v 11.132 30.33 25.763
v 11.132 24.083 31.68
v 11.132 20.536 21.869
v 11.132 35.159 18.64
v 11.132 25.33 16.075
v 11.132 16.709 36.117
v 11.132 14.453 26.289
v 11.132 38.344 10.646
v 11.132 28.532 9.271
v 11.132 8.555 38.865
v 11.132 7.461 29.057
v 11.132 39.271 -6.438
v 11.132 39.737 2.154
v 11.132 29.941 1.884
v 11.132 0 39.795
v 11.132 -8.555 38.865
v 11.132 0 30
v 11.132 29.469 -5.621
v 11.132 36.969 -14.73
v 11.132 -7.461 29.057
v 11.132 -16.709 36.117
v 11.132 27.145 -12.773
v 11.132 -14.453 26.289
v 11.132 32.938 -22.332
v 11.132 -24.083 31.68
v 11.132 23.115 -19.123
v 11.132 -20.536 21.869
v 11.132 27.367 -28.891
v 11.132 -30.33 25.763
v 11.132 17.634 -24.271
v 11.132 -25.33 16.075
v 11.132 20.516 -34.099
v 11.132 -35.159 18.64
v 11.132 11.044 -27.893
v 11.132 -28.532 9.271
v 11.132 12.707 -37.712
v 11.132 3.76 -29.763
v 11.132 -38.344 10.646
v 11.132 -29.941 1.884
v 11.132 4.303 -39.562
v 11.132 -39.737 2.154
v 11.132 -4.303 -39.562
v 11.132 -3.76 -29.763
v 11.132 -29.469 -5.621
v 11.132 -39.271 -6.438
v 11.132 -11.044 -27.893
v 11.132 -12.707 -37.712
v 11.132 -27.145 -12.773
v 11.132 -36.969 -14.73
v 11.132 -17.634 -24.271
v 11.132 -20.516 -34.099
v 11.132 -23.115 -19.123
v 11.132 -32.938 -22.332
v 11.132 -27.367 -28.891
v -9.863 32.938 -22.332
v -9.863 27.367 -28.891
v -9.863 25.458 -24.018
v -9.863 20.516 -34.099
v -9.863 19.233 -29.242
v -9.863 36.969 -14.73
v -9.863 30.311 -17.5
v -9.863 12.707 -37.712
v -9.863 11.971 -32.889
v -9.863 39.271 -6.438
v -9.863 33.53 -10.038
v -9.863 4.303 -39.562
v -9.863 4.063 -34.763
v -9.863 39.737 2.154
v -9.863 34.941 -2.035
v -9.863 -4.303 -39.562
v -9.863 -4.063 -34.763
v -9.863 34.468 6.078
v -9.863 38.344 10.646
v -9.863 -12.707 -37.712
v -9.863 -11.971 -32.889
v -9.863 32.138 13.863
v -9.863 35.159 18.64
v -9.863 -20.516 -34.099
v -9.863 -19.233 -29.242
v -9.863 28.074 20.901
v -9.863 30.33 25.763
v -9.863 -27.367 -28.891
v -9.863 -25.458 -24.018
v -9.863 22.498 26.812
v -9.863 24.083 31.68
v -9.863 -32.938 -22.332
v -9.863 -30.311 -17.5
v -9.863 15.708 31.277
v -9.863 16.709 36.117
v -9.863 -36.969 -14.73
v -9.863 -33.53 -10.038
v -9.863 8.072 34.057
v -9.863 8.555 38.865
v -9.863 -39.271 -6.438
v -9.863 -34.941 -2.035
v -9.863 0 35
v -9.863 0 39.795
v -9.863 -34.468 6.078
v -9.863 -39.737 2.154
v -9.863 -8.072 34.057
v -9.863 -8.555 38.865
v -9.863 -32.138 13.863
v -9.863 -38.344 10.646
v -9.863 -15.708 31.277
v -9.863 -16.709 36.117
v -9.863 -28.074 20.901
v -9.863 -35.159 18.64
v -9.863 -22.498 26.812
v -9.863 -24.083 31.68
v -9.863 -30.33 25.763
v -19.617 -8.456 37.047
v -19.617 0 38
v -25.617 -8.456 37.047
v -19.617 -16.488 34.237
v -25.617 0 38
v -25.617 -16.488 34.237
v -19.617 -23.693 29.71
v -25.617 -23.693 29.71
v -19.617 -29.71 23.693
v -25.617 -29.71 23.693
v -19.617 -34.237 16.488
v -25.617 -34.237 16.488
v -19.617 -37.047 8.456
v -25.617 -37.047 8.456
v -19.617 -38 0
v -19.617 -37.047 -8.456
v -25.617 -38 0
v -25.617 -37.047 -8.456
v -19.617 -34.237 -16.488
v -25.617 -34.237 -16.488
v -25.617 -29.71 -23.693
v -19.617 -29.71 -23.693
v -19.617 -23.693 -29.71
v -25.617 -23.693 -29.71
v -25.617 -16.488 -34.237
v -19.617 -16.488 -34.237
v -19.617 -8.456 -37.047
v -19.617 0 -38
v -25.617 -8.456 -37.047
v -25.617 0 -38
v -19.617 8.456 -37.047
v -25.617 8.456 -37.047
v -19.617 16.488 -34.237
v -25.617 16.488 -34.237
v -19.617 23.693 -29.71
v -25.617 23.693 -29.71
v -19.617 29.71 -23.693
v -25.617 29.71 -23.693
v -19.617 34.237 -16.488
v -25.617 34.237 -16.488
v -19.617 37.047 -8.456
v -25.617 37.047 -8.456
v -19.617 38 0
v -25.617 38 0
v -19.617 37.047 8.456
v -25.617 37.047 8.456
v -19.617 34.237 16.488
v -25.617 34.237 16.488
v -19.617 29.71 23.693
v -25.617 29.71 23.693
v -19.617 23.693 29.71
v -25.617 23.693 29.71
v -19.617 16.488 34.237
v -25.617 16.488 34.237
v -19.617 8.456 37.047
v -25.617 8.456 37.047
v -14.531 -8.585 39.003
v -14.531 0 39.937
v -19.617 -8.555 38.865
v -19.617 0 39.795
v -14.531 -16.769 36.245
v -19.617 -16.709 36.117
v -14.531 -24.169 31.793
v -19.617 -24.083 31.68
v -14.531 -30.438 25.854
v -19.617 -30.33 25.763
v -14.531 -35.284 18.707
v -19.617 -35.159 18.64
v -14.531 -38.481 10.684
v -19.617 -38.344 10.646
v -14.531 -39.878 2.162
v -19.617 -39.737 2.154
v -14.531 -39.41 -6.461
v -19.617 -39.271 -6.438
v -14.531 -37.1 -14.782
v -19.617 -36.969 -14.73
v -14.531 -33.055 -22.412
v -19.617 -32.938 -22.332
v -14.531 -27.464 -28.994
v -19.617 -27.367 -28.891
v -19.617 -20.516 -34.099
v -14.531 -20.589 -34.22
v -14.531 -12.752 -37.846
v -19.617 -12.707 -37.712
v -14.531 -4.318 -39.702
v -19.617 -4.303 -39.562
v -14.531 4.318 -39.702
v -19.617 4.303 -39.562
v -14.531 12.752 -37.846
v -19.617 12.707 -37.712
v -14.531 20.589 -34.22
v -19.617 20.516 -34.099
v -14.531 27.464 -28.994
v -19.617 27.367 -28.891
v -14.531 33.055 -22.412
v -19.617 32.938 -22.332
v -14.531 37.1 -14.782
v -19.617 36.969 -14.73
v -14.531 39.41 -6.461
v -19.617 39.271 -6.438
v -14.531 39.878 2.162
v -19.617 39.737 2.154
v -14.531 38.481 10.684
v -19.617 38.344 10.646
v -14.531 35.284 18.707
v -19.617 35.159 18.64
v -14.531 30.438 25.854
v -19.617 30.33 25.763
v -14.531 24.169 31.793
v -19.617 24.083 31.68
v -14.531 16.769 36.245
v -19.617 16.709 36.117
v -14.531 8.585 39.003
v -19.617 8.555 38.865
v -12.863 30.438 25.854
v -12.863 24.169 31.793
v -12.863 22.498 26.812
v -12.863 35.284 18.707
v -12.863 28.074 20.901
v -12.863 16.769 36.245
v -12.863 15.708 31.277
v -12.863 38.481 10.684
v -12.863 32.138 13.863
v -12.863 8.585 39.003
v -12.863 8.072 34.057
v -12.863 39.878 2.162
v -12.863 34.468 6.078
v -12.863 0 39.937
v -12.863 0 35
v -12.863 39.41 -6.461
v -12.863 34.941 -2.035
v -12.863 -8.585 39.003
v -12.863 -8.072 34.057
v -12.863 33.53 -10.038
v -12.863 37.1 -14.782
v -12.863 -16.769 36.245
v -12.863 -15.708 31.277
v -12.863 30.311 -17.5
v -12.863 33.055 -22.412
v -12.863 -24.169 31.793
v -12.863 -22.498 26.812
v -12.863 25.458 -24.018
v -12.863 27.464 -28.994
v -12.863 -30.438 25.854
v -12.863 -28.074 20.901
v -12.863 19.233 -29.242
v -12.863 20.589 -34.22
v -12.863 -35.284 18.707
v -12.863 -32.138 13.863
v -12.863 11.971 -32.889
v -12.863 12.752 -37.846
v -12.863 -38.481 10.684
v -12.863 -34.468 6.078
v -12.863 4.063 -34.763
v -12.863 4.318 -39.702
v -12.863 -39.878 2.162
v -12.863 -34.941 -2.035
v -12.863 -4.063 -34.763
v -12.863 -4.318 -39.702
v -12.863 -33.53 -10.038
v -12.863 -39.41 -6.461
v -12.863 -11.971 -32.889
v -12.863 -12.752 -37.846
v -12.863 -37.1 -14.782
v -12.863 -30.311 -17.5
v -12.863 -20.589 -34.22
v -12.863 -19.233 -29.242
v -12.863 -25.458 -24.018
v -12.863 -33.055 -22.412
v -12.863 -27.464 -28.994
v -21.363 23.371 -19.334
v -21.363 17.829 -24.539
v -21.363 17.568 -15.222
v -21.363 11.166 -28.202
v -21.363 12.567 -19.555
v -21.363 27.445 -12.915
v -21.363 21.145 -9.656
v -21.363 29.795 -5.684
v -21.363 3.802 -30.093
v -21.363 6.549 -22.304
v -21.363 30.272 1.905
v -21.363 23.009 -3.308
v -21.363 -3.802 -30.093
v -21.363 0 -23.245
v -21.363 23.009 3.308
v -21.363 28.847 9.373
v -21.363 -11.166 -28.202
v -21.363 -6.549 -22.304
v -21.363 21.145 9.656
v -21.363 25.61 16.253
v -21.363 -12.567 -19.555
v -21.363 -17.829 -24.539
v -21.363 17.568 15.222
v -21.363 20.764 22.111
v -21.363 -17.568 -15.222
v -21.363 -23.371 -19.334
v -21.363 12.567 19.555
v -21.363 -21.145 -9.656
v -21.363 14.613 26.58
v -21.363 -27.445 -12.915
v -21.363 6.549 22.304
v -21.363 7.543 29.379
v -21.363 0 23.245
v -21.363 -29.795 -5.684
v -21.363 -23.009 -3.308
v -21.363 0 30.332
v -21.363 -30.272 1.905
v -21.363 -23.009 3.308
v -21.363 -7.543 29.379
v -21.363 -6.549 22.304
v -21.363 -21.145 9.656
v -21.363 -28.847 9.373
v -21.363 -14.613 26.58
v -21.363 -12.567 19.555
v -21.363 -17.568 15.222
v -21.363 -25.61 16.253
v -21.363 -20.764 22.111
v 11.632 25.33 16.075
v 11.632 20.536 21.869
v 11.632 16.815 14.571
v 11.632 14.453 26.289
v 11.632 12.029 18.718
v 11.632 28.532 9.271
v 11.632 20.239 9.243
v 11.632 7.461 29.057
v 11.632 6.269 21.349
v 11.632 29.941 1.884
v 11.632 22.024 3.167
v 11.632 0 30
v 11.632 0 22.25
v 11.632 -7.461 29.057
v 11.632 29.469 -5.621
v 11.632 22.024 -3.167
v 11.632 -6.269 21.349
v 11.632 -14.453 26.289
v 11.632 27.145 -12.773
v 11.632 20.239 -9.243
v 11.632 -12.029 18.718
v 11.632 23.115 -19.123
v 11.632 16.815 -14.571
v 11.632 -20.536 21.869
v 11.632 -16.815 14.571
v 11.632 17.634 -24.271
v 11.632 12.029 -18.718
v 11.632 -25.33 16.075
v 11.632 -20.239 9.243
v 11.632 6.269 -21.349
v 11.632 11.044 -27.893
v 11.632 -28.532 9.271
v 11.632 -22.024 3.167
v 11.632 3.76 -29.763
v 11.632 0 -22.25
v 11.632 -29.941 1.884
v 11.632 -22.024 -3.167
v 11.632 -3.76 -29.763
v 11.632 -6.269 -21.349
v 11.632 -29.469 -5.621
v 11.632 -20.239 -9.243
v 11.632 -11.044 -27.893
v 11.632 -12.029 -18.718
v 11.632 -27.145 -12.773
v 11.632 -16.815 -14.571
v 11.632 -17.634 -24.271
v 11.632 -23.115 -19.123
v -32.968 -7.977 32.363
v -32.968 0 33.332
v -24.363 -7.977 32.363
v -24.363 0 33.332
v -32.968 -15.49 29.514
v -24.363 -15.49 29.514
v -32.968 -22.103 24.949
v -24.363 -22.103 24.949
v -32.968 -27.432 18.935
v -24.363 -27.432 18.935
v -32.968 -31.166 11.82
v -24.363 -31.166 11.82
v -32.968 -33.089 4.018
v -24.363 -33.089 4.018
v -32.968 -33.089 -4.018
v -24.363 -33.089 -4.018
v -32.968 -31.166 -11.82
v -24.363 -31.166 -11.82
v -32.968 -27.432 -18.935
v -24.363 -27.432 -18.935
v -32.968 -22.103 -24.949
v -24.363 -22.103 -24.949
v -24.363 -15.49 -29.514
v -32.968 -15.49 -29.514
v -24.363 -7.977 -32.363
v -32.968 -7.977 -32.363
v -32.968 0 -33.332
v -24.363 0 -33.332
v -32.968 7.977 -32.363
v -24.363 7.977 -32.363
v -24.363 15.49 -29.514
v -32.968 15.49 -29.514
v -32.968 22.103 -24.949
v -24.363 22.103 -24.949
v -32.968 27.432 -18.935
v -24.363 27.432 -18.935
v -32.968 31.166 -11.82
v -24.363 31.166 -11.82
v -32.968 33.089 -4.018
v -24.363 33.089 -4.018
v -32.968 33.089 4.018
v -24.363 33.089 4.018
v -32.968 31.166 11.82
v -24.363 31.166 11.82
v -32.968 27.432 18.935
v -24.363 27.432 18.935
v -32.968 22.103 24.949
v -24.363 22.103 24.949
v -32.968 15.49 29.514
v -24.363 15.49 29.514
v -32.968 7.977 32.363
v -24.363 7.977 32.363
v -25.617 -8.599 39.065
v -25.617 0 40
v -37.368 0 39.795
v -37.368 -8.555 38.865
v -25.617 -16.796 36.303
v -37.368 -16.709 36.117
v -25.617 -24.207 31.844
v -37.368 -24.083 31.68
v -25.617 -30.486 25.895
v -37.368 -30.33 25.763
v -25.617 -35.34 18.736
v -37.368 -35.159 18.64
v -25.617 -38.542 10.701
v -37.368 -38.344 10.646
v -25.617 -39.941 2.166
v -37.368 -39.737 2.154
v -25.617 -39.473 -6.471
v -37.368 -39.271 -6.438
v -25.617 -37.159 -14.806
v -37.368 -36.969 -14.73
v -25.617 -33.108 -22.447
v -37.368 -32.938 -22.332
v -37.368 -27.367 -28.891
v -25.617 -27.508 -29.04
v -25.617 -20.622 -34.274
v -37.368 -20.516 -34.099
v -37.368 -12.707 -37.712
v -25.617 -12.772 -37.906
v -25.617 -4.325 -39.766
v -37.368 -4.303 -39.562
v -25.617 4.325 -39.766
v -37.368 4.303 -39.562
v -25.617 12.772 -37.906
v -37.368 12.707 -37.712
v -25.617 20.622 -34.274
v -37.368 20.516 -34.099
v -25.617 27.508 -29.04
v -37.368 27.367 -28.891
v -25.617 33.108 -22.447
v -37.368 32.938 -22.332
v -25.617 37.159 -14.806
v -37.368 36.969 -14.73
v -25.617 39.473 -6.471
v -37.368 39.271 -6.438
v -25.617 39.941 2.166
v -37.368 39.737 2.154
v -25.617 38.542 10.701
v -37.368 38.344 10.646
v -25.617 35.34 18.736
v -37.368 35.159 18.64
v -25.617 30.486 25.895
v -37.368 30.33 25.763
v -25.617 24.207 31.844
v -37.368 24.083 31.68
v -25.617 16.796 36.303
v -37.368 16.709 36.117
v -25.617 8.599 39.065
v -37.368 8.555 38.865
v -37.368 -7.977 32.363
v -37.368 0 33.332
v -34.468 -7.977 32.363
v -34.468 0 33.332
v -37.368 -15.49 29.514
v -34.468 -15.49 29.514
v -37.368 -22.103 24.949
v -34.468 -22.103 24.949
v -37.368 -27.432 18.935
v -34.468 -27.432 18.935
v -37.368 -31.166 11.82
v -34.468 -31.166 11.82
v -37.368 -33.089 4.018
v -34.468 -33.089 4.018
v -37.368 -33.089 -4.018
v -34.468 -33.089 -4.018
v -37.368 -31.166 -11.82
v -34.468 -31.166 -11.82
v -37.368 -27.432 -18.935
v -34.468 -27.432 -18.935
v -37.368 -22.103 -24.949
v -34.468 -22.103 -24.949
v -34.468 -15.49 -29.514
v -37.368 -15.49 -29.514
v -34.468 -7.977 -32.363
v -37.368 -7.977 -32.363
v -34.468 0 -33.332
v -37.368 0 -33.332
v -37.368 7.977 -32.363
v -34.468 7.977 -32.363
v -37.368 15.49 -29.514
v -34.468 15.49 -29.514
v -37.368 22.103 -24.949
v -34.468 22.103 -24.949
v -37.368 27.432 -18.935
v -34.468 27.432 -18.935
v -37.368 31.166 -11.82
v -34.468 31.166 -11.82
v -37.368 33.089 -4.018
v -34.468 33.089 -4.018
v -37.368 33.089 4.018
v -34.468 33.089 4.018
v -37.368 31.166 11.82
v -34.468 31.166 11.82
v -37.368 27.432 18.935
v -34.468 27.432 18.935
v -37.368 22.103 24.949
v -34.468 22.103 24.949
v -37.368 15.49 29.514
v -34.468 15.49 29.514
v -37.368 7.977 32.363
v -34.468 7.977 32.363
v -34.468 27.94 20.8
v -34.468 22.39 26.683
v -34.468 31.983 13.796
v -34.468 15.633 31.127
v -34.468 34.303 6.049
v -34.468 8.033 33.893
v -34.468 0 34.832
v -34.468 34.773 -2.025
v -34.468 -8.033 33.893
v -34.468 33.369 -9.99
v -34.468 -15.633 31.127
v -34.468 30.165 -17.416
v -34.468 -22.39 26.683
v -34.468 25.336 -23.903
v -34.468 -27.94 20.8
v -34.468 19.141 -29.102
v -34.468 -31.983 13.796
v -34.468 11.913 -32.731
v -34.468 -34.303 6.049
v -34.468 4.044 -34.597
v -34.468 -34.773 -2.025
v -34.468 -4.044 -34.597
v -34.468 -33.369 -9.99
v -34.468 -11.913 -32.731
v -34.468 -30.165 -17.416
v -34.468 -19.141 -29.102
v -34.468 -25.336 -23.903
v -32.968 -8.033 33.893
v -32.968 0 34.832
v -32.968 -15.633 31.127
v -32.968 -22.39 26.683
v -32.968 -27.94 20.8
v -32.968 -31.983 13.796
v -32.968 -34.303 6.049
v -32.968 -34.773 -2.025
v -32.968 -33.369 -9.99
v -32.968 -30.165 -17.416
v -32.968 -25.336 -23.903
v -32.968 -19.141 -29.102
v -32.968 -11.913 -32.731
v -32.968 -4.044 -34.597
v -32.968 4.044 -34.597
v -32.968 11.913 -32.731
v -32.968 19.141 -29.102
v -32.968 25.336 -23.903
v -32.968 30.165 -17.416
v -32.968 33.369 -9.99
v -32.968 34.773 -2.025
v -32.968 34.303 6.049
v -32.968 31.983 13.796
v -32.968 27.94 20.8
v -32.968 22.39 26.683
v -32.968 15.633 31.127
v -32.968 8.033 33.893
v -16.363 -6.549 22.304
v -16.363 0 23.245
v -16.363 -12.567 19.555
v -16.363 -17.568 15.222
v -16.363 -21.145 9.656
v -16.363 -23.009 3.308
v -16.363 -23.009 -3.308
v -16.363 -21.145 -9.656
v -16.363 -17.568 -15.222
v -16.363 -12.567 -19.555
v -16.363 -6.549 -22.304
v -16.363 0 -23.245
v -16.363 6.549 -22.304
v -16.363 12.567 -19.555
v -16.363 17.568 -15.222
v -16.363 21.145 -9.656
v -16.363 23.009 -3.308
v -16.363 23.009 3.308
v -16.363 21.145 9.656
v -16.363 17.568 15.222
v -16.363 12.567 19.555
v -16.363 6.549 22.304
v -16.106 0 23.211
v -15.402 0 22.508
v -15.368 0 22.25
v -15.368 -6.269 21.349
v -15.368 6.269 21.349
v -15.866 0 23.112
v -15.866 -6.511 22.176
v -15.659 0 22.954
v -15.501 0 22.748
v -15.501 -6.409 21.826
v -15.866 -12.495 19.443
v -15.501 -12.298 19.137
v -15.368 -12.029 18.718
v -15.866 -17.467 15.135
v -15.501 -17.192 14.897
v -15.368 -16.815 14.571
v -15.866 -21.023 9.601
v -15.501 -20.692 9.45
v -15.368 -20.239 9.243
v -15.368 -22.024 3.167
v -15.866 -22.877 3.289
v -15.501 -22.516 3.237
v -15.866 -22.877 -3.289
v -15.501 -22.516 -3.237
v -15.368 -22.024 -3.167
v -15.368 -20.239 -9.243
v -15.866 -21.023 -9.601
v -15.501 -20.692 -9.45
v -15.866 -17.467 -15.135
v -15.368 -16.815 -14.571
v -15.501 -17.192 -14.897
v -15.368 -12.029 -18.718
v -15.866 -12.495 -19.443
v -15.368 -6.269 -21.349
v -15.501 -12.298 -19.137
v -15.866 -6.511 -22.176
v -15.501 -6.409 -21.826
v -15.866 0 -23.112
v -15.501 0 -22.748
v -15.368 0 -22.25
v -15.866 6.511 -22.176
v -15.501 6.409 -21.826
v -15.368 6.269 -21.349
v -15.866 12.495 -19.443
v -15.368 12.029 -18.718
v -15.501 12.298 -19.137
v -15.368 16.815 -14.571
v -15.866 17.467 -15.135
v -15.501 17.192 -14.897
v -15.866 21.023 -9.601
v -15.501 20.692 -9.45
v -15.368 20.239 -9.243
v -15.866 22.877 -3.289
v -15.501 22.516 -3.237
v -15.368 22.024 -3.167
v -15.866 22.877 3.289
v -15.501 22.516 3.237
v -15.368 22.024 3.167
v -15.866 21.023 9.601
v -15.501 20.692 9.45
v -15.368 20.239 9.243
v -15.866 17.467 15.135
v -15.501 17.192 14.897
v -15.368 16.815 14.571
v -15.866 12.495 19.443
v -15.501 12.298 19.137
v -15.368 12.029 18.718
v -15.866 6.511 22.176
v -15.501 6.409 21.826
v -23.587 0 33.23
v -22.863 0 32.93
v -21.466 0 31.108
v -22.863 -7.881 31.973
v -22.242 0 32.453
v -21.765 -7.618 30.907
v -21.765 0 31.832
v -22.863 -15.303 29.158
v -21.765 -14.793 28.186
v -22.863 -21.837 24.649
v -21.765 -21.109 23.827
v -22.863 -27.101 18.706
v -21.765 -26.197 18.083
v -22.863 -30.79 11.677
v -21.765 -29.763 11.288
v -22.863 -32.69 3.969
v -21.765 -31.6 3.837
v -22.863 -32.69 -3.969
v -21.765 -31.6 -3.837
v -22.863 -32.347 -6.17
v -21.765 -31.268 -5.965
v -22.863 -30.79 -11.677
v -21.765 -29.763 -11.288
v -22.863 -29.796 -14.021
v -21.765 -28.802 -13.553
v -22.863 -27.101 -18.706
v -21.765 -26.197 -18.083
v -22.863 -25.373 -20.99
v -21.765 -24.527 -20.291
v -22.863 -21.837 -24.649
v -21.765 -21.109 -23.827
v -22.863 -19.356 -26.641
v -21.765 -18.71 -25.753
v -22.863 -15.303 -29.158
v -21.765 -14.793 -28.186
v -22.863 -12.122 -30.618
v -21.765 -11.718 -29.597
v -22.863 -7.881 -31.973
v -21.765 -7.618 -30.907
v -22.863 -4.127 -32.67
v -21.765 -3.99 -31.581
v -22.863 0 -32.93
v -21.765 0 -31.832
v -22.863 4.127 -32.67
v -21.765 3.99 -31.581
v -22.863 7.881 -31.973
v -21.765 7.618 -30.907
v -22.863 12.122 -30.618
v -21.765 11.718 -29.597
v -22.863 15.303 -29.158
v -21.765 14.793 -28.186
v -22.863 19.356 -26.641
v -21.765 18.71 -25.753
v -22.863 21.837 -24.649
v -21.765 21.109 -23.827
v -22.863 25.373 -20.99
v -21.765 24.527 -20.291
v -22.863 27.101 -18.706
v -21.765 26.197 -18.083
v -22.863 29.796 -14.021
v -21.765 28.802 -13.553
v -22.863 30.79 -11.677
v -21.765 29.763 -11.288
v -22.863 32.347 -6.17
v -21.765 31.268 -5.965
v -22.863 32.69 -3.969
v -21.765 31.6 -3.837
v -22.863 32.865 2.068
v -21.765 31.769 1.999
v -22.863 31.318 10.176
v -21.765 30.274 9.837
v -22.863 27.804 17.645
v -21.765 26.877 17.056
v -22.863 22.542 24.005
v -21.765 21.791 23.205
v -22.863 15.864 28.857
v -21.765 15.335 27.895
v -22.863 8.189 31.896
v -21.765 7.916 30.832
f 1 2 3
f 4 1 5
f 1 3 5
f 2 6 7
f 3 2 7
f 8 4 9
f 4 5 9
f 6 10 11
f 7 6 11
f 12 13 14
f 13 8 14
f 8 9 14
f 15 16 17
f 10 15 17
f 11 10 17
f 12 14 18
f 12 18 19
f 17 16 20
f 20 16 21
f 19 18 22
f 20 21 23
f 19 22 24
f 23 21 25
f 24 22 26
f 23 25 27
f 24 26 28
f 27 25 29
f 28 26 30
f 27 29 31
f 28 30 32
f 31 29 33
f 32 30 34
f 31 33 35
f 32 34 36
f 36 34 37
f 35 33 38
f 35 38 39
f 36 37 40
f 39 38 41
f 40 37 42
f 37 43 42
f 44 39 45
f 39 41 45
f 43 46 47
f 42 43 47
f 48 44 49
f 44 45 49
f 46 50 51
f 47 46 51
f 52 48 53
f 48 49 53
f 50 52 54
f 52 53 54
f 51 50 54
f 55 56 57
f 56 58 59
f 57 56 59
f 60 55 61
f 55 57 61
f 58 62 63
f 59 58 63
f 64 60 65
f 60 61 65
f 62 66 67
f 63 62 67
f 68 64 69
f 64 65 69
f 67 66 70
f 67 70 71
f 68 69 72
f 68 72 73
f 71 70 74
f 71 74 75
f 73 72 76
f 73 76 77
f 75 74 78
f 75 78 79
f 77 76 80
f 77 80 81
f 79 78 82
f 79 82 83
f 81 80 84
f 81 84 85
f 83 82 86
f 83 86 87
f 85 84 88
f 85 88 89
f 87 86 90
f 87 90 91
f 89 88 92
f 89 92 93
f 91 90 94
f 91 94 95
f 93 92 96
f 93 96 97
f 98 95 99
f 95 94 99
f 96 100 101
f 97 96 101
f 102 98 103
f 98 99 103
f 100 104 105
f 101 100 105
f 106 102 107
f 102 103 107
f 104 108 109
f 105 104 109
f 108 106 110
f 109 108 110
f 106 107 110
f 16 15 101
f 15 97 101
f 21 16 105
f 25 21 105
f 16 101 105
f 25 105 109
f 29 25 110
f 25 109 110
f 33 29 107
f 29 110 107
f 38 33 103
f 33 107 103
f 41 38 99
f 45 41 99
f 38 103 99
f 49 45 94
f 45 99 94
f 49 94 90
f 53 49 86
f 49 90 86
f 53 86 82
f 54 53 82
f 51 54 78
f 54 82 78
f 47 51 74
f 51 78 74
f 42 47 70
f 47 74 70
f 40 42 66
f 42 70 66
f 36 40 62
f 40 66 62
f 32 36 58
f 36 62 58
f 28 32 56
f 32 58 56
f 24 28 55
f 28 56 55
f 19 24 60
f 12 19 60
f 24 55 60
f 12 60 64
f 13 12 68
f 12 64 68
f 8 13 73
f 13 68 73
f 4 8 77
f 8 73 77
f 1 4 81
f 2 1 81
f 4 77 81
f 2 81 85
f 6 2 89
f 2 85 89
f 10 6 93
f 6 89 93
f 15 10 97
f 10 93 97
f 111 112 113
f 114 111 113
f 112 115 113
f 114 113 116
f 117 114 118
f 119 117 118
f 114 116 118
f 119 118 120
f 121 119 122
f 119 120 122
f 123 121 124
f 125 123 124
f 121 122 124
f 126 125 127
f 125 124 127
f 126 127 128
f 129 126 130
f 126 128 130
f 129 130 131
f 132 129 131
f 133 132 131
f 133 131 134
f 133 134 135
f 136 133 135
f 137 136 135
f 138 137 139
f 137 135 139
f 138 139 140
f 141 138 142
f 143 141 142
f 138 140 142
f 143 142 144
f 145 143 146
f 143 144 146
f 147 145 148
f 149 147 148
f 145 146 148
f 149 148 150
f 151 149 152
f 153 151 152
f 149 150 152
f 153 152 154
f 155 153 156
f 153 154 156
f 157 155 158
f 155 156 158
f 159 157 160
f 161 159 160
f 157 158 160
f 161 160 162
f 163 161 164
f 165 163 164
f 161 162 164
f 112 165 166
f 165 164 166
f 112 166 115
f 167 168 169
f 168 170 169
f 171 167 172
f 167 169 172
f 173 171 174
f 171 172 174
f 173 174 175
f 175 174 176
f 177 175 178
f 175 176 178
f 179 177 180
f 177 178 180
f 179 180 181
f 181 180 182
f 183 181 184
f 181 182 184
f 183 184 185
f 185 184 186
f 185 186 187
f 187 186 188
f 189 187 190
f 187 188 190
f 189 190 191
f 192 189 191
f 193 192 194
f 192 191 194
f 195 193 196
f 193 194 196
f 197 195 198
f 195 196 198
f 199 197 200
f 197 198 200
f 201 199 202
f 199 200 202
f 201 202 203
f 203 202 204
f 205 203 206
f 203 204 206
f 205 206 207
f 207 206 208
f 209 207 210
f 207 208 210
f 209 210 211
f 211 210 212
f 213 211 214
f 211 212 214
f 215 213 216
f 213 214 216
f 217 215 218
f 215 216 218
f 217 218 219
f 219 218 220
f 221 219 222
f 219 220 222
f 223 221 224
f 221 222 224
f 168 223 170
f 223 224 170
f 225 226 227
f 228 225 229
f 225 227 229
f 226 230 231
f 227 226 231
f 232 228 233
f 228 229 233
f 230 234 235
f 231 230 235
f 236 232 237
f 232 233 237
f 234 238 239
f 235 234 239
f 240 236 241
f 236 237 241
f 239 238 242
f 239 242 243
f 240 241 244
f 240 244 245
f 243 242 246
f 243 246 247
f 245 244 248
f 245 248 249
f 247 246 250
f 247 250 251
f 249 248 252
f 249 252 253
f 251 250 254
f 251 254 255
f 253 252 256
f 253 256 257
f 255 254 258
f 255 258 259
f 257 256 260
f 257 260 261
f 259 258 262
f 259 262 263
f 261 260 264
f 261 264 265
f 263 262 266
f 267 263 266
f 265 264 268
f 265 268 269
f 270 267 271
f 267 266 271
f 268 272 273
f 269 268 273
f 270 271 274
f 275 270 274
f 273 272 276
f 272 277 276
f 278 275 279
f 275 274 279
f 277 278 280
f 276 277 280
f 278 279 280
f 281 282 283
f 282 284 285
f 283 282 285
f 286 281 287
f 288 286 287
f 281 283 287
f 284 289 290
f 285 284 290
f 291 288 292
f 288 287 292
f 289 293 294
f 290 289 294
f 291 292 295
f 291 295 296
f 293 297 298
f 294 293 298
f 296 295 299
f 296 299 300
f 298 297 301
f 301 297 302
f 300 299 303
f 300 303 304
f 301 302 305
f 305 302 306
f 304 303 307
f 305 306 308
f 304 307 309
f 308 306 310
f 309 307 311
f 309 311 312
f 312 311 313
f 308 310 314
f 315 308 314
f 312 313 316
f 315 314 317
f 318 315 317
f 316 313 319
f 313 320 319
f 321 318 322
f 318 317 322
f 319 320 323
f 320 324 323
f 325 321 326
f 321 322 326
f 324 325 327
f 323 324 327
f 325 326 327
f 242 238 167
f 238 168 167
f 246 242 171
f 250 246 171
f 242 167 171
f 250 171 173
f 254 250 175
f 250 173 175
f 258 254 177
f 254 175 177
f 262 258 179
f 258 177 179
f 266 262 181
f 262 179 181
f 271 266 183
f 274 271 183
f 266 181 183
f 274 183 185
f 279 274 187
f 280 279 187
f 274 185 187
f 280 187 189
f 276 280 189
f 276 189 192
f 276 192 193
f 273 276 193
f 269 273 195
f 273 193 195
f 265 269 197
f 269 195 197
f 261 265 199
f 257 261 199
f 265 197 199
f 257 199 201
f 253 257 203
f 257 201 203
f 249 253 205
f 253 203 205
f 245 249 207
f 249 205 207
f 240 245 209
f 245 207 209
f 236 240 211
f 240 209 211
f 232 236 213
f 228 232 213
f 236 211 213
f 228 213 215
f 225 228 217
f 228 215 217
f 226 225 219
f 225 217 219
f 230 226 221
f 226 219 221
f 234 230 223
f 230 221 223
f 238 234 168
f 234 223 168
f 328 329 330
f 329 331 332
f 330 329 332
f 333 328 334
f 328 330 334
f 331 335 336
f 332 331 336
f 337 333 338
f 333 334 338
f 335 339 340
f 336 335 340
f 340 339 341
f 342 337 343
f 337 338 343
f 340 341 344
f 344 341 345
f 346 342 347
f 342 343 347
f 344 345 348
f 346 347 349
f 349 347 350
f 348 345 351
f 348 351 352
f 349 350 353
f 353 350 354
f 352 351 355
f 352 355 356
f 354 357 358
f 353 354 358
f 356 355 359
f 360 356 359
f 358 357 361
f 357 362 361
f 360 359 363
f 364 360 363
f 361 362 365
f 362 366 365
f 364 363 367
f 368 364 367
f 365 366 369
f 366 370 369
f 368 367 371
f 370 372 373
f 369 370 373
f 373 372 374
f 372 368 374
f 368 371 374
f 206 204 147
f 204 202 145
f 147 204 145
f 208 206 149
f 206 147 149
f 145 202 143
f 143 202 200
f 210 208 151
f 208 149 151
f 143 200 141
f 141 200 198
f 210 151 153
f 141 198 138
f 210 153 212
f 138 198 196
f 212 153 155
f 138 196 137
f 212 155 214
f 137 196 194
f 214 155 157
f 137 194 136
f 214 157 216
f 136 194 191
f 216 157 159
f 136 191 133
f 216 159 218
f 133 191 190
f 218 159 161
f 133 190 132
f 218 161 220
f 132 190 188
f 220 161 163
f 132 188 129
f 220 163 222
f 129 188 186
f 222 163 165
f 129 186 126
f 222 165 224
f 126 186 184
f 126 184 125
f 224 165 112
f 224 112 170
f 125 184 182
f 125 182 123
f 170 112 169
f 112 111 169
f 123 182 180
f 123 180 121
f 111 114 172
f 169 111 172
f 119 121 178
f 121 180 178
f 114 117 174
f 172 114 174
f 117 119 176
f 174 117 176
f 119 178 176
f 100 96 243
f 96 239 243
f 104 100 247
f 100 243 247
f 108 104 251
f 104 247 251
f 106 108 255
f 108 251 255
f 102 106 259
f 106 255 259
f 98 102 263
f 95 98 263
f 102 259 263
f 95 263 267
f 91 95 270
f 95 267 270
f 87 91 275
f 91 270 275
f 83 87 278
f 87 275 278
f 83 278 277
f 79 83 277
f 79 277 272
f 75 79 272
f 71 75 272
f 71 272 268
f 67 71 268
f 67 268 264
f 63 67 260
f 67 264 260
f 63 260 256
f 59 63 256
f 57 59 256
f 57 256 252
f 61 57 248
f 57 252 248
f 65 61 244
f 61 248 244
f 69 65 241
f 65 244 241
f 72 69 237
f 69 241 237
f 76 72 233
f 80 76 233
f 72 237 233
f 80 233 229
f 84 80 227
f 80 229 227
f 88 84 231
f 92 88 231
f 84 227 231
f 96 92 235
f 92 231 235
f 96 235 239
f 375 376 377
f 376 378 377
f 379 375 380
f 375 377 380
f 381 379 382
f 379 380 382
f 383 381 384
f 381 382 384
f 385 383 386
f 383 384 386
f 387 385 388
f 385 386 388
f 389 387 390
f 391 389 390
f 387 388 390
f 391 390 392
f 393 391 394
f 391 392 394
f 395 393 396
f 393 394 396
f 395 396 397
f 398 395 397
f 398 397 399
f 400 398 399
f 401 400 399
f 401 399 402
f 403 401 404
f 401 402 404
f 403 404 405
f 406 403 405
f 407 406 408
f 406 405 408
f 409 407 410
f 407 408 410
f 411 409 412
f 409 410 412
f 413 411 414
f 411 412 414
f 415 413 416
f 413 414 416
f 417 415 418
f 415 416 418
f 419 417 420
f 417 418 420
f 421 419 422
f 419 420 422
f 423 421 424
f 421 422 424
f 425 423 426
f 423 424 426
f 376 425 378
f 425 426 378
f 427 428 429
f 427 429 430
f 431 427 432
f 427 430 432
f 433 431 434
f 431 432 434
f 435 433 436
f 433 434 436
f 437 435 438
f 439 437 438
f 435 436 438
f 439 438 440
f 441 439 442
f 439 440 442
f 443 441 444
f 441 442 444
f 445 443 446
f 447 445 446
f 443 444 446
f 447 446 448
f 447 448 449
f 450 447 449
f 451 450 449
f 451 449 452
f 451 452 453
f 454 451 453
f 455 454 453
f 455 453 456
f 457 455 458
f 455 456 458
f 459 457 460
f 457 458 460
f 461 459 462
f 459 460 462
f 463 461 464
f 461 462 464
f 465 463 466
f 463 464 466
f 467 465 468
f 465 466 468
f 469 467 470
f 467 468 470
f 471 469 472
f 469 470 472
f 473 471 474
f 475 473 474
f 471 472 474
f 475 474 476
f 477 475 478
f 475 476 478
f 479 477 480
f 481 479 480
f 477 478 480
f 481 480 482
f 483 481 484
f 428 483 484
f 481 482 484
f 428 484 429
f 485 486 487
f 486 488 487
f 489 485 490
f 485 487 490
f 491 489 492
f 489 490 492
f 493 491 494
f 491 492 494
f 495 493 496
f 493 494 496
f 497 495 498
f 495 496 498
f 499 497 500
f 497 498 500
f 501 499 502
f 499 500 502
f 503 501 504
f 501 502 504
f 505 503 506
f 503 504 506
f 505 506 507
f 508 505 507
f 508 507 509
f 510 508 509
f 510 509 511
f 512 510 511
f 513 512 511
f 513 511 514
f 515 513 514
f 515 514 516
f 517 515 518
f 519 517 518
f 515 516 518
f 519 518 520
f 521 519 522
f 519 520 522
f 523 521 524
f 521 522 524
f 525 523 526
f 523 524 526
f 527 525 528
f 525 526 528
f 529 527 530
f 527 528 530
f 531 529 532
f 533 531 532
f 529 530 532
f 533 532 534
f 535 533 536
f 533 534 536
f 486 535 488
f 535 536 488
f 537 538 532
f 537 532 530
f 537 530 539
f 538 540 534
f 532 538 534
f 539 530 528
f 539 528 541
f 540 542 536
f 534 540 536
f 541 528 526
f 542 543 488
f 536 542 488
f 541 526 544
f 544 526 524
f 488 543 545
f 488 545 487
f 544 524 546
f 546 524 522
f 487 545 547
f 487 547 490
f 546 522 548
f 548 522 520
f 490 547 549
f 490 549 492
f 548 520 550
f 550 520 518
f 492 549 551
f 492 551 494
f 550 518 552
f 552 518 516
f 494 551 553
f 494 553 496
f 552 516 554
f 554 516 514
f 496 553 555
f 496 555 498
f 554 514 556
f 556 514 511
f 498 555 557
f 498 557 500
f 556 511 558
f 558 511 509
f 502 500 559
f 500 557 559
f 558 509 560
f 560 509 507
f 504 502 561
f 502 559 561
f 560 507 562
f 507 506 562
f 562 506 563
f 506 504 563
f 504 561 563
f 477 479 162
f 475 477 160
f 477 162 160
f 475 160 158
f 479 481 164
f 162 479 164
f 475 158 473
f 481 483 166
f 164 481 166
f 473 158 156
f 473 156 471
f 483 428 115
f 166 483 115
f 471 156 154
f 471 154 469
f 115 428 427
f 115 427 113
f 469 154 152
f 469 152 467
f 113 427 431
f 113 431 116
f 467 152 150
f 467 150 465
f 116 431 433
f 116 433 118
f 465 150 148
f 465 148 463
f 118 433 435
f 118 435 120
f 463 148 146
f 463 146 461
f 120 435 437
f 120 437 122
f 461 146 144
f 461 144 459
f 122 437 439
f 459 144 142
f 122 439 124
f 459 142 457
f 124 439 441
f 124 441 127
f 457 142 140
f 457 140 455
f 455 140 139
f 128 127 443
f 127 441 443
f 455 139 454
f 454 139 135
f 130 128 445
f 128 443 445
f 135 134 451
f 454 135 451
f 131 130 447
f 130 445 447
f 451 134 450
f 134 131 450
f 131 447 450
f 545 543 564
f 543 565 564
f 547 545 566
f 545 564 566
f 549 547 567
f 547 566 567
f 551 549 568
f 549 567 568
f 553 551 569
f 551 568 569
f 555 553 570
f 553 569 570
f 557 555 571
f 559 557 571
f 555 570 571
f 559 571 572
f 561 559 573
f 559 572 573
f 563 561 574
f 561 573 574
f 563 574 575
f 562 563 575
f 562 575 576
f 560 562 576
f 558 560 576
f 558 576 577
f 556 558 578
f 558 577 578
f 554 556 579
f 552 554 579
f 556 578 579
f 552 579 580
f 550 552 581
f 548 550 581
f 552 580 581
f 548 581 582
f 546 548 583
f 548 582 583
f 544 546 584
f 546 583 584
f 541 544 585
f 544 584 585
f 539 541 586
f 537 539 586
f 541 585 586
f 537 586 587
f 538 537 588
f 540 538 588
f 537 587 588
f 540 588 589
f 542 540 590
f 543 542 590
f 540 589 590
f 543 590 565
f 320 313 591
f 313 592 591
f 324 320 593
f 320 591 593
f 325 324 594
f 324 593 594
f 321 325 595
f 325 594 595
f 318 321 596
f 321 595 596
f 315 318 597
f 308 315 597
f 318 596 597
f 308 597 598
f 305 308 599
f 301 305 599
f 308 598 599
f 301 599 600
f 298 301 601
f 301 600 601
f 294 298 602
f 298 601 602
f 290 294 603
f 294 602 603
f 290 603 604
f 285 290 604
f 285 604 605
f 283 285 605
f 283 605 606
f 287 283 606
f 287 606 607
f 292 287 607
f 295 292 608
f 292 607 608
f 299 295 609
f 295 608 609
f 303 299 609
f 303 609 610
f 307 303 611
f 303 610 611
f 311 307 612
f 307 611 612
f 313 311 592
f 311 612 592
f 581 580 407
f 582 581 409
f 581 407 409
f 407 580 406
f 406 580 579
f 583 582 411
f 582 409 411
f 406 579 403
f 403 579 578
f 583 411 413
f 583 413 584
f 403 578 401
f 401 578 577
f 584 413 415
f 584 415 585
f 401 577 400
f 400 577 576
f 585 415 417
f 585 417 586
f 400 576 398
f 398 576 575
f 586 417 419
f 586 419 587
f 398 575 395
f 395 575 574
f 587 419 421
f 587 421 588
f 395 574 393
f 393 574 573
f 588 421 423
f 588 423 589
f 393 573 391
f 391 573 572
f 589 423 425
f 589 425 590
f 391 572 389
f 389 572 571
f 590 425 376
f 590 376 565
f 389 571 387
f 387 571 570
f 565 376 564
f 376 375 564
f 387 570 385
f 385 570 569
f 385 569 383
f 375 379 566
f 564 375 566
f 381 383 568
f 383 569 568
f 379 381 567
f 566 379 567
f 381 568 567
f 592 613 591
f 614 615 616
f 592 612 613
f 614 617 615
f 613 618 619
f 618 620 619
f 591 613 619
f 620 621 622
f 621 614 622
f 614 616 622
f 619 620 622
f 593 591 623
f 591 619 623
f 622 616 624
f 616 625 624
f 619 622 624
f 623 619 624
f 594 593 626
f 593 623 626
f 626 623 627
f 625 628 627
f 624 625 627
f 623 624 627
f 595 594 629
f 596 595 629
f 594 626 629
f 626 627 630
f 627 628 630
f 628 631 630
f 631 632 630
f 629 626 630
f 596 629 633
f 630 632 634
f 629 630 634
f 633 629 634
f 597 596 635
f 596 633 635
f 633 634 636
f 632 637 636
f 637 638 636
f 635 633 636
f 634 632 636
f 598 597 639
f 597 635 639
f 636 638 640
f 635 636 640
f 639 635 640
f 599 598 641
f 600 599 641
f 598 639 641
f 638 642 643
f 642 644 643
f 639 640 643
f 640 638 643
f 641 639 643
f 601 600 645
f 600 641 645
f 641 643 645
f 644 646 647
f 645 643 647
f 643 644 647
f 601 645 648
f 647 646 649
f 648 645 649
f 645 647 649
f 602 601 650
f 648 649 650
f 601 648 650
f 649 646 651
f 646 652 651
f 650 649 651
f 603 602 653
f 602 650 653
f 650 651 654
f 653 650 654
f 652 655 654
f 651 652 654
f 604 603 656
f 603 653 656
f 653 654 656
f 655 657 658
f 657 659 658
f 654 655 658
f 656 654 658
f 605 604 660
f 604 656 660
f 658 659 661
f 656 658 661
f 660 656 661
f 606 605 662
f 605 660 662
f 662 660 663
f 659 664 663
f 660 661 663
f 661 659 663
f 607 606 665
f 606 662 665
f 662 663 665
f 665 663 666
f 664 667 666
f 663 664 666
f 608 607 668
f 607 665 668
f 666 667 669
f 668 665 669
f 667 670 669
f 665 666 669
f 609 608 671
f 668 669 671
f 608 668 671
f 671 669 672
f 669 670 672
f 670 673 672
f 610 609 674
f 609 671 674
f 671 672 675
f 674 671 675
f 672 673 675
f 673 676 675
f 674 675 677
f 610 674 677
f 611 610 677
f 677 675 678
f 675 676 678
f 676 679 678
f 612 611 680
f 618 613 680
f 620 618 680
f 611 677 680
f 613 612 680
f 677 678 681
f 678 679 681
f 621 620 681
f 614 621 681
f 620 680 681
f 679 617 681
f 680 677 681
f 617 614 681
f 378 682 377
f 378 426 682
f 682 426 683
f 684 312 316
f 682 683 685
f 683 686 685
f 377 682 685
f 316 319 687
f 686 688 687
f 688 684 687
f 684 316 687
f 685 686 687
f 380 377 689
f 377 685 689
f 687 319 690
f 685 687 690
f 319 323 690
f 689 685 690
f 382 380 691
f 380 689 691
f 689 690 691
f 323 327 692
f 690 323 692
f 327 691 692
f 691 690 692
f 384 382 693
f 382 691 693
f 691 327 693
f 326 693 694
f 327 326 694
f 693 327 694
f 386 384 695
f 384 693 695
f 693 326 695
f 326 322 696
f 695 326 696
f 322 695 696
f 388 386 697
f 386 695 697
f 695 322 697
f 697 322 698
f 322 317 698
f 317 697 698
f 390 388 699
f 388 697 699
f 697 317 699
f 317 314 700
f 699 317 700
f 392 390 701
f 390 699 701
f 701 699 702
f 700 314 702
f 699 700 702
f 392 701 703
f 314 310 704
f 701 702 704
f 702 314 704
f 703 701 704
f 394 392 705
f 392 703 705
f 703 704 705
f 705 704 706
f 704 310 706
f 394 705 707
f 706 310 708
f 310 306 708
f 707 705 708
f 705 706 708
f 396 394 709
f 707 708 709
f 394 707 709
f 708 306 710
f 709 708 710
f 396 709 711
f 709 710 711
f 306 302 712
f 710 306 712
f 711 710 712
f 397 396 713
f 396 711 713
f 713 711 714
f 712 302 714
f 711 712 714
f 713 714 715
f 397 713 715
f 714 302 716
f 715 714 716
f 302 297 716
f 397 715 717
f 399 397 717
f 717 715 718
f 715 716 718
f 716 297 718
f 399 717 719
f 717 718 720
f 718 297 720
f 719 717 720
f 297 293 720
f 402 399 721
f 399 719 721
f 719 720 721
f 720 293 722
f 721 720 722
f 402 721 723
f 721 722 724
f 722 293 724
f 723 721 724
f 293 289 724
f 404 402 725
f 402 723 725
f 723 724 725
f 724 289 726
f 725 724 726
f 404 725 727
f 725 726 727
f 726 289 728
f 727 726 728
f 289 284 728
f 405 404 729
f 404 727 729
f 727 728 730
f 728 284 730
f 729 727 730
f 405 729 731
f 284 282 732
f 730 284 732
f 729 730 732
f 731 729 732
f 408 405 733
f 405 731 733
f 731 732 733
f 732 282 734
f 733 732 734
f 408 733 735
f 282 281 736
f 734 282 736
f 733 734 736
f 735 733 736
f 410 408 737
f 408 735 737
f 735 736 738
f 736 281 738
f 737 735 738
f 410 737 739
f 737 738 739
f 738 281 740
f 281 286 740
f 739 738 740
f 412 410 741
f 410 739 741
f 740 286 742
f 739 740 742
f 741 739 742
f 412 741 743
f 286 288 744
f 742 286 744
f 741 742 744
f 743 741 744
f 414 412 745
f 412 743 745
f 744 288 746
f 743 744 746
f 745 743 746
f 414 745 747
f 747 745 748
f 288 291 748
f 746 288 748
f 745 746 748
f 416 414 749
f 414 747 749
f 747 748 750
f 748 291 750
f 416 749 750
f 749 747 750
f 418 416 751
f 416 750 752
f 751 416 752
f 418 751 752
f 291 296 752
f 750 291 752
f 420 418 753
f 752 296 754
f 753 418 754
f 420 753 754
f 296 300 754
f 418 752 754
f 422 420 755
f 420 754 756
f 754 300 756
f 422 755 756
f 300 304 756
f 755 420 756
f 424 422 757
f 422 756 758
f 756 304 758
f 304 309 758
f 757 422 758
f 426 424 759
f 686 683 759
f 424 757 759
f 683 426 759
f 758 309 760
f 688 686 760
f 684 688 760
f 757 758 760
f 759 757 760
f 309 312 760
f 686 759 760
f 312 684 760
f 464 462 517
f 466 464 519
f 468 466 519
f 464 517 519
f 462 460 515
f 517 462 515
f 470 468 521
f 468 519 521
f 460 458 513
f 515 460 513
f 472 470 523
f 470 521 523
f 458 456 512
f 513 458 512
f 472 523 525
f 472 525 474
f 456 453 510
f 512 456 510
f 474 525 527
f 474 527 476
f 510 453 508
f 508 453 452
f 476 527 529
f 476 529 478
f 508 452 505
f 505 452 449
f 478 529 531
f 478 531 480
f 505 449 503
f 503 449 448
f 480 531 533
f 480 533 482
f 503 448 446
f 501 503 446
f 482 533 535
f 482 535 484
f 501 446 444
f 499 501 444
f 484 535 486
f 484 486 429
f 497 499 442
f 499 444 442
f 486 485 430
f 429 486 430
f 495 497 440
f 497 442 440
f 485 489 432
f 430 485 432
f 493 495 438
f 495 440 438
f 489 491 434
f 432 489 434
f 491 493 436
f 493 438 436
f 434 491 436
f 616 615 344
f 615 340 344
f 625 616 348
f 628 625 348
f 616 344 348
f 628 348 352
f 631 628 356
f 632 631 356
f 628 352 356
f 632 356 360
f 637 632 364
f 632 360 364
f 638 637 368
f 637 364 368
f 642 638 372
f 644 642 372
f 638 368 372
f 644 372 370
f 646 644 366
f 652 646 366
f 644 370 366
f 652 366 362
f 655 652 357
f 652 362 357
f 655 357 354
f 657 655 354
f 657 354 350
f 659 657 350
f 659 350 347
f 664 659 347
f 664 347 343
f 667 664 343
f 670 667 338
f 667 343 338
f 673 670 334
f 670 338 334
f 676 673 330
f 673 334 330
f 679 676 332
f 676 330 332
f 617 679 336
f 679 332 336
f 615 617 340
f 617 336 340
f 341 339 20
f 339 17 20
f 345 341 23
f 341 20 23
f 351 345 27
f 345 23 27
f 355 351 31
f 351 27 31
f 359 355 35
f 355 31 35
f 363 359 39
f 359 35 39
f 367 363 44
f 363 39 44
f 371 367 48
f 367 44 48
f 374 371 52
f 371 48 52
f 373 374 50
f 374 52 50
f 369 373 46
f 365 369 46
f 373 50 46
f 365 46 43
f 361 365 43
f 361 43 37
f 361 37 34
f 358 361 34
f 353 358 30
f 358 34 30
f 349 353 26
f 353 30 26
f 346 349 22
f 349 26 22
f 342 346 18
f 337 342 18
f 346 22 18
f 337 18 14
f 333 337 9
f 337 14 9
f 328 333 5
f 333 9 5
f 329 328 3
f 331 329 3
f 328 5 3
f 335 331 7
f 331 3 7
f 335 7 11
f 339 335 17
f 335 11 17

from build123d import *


with BuildPart() as part:
    # Sketch1 → Revolve1 (revolve)
    with BuildSketch(Plane.XY, mode=Mode.PRIVATE) as revolve1_sk:
        with BuildLine():
            Line((-15.367932956, -22.25), (11.632067044, -22.25))
            Line((11.632067044, -22.25), (11.632067044, -30))
            Line((11.632067044, -30), (11.132067044, -30))
            Line((11.132067044, -30), (11.132067044, -39.794883762))
            Line((11.132067044, -39.794883762), (-9.863295576, -39.794883762))
            Line((-9.863295576, -39.794883762), (-9.863295576, -35))
            Line((-9.863295576, -35), (-12.863295576, -35))
            Line((-12.863295576, -35), (-12.863295576, -39.936502505))
            Line((-12.863295576, -39.936502505), (-14.531334037, -39.936502505))
            Line((-14.531334037, -39.936502505), (-19.616831546, -39.794883762))
            Line((-19.616831546, -39.794883762), (-19.616831546, -38))
            Line((-19.616831546, -38), (-25.616831546, -38))
            Line((-25.616831546, -38), (-25.616831546, -40))
            Line((-25.616831546, -40), (-37.367932956, -39.794883762))
            Line((-37.367932956, -39.794883762), (-37.367932956, -33.332032388))
            Line((-37.367932956, -33.332032388), (-34.467915466, -33.332032388))
            Line((-34.467915466, -33.332032388), (-34.467915466, -34.832032388))
            Line((-34.467915466, -34.832032388), (-32.967915466, -34.832032388))
            Line((-32.967915466, -34.832032388), (-32.967915466, -33.332032388))
            Line((-32.967915466, -33.332032388), (-24.363295576, -33.332032388))
            ThreePointArc((-24.363295576, -33.332032388), (-22.241975232, -32.453352732), (-21.363295576, -30.332032388))
            Line((-21.363295576, -30.332032388), (-21.363295576, -23.24536262))
            Line((-21.363295576, -23.24536262), (-16.363295576, -23.24536262))
            ThreePointArc((-16.363295576, -23.24536262), (-15.659467917, -22.953827658), (-15.367932956, -22.25))
        make_face()
    revolve(revolve1_sk.sketch.rotate(Axis((-66.026476718, 0, 0), (1, 0, 0)), 270), axis=Axis((-66.026476718, 0, 0), (1, 0, 0)))


solid = part.part
